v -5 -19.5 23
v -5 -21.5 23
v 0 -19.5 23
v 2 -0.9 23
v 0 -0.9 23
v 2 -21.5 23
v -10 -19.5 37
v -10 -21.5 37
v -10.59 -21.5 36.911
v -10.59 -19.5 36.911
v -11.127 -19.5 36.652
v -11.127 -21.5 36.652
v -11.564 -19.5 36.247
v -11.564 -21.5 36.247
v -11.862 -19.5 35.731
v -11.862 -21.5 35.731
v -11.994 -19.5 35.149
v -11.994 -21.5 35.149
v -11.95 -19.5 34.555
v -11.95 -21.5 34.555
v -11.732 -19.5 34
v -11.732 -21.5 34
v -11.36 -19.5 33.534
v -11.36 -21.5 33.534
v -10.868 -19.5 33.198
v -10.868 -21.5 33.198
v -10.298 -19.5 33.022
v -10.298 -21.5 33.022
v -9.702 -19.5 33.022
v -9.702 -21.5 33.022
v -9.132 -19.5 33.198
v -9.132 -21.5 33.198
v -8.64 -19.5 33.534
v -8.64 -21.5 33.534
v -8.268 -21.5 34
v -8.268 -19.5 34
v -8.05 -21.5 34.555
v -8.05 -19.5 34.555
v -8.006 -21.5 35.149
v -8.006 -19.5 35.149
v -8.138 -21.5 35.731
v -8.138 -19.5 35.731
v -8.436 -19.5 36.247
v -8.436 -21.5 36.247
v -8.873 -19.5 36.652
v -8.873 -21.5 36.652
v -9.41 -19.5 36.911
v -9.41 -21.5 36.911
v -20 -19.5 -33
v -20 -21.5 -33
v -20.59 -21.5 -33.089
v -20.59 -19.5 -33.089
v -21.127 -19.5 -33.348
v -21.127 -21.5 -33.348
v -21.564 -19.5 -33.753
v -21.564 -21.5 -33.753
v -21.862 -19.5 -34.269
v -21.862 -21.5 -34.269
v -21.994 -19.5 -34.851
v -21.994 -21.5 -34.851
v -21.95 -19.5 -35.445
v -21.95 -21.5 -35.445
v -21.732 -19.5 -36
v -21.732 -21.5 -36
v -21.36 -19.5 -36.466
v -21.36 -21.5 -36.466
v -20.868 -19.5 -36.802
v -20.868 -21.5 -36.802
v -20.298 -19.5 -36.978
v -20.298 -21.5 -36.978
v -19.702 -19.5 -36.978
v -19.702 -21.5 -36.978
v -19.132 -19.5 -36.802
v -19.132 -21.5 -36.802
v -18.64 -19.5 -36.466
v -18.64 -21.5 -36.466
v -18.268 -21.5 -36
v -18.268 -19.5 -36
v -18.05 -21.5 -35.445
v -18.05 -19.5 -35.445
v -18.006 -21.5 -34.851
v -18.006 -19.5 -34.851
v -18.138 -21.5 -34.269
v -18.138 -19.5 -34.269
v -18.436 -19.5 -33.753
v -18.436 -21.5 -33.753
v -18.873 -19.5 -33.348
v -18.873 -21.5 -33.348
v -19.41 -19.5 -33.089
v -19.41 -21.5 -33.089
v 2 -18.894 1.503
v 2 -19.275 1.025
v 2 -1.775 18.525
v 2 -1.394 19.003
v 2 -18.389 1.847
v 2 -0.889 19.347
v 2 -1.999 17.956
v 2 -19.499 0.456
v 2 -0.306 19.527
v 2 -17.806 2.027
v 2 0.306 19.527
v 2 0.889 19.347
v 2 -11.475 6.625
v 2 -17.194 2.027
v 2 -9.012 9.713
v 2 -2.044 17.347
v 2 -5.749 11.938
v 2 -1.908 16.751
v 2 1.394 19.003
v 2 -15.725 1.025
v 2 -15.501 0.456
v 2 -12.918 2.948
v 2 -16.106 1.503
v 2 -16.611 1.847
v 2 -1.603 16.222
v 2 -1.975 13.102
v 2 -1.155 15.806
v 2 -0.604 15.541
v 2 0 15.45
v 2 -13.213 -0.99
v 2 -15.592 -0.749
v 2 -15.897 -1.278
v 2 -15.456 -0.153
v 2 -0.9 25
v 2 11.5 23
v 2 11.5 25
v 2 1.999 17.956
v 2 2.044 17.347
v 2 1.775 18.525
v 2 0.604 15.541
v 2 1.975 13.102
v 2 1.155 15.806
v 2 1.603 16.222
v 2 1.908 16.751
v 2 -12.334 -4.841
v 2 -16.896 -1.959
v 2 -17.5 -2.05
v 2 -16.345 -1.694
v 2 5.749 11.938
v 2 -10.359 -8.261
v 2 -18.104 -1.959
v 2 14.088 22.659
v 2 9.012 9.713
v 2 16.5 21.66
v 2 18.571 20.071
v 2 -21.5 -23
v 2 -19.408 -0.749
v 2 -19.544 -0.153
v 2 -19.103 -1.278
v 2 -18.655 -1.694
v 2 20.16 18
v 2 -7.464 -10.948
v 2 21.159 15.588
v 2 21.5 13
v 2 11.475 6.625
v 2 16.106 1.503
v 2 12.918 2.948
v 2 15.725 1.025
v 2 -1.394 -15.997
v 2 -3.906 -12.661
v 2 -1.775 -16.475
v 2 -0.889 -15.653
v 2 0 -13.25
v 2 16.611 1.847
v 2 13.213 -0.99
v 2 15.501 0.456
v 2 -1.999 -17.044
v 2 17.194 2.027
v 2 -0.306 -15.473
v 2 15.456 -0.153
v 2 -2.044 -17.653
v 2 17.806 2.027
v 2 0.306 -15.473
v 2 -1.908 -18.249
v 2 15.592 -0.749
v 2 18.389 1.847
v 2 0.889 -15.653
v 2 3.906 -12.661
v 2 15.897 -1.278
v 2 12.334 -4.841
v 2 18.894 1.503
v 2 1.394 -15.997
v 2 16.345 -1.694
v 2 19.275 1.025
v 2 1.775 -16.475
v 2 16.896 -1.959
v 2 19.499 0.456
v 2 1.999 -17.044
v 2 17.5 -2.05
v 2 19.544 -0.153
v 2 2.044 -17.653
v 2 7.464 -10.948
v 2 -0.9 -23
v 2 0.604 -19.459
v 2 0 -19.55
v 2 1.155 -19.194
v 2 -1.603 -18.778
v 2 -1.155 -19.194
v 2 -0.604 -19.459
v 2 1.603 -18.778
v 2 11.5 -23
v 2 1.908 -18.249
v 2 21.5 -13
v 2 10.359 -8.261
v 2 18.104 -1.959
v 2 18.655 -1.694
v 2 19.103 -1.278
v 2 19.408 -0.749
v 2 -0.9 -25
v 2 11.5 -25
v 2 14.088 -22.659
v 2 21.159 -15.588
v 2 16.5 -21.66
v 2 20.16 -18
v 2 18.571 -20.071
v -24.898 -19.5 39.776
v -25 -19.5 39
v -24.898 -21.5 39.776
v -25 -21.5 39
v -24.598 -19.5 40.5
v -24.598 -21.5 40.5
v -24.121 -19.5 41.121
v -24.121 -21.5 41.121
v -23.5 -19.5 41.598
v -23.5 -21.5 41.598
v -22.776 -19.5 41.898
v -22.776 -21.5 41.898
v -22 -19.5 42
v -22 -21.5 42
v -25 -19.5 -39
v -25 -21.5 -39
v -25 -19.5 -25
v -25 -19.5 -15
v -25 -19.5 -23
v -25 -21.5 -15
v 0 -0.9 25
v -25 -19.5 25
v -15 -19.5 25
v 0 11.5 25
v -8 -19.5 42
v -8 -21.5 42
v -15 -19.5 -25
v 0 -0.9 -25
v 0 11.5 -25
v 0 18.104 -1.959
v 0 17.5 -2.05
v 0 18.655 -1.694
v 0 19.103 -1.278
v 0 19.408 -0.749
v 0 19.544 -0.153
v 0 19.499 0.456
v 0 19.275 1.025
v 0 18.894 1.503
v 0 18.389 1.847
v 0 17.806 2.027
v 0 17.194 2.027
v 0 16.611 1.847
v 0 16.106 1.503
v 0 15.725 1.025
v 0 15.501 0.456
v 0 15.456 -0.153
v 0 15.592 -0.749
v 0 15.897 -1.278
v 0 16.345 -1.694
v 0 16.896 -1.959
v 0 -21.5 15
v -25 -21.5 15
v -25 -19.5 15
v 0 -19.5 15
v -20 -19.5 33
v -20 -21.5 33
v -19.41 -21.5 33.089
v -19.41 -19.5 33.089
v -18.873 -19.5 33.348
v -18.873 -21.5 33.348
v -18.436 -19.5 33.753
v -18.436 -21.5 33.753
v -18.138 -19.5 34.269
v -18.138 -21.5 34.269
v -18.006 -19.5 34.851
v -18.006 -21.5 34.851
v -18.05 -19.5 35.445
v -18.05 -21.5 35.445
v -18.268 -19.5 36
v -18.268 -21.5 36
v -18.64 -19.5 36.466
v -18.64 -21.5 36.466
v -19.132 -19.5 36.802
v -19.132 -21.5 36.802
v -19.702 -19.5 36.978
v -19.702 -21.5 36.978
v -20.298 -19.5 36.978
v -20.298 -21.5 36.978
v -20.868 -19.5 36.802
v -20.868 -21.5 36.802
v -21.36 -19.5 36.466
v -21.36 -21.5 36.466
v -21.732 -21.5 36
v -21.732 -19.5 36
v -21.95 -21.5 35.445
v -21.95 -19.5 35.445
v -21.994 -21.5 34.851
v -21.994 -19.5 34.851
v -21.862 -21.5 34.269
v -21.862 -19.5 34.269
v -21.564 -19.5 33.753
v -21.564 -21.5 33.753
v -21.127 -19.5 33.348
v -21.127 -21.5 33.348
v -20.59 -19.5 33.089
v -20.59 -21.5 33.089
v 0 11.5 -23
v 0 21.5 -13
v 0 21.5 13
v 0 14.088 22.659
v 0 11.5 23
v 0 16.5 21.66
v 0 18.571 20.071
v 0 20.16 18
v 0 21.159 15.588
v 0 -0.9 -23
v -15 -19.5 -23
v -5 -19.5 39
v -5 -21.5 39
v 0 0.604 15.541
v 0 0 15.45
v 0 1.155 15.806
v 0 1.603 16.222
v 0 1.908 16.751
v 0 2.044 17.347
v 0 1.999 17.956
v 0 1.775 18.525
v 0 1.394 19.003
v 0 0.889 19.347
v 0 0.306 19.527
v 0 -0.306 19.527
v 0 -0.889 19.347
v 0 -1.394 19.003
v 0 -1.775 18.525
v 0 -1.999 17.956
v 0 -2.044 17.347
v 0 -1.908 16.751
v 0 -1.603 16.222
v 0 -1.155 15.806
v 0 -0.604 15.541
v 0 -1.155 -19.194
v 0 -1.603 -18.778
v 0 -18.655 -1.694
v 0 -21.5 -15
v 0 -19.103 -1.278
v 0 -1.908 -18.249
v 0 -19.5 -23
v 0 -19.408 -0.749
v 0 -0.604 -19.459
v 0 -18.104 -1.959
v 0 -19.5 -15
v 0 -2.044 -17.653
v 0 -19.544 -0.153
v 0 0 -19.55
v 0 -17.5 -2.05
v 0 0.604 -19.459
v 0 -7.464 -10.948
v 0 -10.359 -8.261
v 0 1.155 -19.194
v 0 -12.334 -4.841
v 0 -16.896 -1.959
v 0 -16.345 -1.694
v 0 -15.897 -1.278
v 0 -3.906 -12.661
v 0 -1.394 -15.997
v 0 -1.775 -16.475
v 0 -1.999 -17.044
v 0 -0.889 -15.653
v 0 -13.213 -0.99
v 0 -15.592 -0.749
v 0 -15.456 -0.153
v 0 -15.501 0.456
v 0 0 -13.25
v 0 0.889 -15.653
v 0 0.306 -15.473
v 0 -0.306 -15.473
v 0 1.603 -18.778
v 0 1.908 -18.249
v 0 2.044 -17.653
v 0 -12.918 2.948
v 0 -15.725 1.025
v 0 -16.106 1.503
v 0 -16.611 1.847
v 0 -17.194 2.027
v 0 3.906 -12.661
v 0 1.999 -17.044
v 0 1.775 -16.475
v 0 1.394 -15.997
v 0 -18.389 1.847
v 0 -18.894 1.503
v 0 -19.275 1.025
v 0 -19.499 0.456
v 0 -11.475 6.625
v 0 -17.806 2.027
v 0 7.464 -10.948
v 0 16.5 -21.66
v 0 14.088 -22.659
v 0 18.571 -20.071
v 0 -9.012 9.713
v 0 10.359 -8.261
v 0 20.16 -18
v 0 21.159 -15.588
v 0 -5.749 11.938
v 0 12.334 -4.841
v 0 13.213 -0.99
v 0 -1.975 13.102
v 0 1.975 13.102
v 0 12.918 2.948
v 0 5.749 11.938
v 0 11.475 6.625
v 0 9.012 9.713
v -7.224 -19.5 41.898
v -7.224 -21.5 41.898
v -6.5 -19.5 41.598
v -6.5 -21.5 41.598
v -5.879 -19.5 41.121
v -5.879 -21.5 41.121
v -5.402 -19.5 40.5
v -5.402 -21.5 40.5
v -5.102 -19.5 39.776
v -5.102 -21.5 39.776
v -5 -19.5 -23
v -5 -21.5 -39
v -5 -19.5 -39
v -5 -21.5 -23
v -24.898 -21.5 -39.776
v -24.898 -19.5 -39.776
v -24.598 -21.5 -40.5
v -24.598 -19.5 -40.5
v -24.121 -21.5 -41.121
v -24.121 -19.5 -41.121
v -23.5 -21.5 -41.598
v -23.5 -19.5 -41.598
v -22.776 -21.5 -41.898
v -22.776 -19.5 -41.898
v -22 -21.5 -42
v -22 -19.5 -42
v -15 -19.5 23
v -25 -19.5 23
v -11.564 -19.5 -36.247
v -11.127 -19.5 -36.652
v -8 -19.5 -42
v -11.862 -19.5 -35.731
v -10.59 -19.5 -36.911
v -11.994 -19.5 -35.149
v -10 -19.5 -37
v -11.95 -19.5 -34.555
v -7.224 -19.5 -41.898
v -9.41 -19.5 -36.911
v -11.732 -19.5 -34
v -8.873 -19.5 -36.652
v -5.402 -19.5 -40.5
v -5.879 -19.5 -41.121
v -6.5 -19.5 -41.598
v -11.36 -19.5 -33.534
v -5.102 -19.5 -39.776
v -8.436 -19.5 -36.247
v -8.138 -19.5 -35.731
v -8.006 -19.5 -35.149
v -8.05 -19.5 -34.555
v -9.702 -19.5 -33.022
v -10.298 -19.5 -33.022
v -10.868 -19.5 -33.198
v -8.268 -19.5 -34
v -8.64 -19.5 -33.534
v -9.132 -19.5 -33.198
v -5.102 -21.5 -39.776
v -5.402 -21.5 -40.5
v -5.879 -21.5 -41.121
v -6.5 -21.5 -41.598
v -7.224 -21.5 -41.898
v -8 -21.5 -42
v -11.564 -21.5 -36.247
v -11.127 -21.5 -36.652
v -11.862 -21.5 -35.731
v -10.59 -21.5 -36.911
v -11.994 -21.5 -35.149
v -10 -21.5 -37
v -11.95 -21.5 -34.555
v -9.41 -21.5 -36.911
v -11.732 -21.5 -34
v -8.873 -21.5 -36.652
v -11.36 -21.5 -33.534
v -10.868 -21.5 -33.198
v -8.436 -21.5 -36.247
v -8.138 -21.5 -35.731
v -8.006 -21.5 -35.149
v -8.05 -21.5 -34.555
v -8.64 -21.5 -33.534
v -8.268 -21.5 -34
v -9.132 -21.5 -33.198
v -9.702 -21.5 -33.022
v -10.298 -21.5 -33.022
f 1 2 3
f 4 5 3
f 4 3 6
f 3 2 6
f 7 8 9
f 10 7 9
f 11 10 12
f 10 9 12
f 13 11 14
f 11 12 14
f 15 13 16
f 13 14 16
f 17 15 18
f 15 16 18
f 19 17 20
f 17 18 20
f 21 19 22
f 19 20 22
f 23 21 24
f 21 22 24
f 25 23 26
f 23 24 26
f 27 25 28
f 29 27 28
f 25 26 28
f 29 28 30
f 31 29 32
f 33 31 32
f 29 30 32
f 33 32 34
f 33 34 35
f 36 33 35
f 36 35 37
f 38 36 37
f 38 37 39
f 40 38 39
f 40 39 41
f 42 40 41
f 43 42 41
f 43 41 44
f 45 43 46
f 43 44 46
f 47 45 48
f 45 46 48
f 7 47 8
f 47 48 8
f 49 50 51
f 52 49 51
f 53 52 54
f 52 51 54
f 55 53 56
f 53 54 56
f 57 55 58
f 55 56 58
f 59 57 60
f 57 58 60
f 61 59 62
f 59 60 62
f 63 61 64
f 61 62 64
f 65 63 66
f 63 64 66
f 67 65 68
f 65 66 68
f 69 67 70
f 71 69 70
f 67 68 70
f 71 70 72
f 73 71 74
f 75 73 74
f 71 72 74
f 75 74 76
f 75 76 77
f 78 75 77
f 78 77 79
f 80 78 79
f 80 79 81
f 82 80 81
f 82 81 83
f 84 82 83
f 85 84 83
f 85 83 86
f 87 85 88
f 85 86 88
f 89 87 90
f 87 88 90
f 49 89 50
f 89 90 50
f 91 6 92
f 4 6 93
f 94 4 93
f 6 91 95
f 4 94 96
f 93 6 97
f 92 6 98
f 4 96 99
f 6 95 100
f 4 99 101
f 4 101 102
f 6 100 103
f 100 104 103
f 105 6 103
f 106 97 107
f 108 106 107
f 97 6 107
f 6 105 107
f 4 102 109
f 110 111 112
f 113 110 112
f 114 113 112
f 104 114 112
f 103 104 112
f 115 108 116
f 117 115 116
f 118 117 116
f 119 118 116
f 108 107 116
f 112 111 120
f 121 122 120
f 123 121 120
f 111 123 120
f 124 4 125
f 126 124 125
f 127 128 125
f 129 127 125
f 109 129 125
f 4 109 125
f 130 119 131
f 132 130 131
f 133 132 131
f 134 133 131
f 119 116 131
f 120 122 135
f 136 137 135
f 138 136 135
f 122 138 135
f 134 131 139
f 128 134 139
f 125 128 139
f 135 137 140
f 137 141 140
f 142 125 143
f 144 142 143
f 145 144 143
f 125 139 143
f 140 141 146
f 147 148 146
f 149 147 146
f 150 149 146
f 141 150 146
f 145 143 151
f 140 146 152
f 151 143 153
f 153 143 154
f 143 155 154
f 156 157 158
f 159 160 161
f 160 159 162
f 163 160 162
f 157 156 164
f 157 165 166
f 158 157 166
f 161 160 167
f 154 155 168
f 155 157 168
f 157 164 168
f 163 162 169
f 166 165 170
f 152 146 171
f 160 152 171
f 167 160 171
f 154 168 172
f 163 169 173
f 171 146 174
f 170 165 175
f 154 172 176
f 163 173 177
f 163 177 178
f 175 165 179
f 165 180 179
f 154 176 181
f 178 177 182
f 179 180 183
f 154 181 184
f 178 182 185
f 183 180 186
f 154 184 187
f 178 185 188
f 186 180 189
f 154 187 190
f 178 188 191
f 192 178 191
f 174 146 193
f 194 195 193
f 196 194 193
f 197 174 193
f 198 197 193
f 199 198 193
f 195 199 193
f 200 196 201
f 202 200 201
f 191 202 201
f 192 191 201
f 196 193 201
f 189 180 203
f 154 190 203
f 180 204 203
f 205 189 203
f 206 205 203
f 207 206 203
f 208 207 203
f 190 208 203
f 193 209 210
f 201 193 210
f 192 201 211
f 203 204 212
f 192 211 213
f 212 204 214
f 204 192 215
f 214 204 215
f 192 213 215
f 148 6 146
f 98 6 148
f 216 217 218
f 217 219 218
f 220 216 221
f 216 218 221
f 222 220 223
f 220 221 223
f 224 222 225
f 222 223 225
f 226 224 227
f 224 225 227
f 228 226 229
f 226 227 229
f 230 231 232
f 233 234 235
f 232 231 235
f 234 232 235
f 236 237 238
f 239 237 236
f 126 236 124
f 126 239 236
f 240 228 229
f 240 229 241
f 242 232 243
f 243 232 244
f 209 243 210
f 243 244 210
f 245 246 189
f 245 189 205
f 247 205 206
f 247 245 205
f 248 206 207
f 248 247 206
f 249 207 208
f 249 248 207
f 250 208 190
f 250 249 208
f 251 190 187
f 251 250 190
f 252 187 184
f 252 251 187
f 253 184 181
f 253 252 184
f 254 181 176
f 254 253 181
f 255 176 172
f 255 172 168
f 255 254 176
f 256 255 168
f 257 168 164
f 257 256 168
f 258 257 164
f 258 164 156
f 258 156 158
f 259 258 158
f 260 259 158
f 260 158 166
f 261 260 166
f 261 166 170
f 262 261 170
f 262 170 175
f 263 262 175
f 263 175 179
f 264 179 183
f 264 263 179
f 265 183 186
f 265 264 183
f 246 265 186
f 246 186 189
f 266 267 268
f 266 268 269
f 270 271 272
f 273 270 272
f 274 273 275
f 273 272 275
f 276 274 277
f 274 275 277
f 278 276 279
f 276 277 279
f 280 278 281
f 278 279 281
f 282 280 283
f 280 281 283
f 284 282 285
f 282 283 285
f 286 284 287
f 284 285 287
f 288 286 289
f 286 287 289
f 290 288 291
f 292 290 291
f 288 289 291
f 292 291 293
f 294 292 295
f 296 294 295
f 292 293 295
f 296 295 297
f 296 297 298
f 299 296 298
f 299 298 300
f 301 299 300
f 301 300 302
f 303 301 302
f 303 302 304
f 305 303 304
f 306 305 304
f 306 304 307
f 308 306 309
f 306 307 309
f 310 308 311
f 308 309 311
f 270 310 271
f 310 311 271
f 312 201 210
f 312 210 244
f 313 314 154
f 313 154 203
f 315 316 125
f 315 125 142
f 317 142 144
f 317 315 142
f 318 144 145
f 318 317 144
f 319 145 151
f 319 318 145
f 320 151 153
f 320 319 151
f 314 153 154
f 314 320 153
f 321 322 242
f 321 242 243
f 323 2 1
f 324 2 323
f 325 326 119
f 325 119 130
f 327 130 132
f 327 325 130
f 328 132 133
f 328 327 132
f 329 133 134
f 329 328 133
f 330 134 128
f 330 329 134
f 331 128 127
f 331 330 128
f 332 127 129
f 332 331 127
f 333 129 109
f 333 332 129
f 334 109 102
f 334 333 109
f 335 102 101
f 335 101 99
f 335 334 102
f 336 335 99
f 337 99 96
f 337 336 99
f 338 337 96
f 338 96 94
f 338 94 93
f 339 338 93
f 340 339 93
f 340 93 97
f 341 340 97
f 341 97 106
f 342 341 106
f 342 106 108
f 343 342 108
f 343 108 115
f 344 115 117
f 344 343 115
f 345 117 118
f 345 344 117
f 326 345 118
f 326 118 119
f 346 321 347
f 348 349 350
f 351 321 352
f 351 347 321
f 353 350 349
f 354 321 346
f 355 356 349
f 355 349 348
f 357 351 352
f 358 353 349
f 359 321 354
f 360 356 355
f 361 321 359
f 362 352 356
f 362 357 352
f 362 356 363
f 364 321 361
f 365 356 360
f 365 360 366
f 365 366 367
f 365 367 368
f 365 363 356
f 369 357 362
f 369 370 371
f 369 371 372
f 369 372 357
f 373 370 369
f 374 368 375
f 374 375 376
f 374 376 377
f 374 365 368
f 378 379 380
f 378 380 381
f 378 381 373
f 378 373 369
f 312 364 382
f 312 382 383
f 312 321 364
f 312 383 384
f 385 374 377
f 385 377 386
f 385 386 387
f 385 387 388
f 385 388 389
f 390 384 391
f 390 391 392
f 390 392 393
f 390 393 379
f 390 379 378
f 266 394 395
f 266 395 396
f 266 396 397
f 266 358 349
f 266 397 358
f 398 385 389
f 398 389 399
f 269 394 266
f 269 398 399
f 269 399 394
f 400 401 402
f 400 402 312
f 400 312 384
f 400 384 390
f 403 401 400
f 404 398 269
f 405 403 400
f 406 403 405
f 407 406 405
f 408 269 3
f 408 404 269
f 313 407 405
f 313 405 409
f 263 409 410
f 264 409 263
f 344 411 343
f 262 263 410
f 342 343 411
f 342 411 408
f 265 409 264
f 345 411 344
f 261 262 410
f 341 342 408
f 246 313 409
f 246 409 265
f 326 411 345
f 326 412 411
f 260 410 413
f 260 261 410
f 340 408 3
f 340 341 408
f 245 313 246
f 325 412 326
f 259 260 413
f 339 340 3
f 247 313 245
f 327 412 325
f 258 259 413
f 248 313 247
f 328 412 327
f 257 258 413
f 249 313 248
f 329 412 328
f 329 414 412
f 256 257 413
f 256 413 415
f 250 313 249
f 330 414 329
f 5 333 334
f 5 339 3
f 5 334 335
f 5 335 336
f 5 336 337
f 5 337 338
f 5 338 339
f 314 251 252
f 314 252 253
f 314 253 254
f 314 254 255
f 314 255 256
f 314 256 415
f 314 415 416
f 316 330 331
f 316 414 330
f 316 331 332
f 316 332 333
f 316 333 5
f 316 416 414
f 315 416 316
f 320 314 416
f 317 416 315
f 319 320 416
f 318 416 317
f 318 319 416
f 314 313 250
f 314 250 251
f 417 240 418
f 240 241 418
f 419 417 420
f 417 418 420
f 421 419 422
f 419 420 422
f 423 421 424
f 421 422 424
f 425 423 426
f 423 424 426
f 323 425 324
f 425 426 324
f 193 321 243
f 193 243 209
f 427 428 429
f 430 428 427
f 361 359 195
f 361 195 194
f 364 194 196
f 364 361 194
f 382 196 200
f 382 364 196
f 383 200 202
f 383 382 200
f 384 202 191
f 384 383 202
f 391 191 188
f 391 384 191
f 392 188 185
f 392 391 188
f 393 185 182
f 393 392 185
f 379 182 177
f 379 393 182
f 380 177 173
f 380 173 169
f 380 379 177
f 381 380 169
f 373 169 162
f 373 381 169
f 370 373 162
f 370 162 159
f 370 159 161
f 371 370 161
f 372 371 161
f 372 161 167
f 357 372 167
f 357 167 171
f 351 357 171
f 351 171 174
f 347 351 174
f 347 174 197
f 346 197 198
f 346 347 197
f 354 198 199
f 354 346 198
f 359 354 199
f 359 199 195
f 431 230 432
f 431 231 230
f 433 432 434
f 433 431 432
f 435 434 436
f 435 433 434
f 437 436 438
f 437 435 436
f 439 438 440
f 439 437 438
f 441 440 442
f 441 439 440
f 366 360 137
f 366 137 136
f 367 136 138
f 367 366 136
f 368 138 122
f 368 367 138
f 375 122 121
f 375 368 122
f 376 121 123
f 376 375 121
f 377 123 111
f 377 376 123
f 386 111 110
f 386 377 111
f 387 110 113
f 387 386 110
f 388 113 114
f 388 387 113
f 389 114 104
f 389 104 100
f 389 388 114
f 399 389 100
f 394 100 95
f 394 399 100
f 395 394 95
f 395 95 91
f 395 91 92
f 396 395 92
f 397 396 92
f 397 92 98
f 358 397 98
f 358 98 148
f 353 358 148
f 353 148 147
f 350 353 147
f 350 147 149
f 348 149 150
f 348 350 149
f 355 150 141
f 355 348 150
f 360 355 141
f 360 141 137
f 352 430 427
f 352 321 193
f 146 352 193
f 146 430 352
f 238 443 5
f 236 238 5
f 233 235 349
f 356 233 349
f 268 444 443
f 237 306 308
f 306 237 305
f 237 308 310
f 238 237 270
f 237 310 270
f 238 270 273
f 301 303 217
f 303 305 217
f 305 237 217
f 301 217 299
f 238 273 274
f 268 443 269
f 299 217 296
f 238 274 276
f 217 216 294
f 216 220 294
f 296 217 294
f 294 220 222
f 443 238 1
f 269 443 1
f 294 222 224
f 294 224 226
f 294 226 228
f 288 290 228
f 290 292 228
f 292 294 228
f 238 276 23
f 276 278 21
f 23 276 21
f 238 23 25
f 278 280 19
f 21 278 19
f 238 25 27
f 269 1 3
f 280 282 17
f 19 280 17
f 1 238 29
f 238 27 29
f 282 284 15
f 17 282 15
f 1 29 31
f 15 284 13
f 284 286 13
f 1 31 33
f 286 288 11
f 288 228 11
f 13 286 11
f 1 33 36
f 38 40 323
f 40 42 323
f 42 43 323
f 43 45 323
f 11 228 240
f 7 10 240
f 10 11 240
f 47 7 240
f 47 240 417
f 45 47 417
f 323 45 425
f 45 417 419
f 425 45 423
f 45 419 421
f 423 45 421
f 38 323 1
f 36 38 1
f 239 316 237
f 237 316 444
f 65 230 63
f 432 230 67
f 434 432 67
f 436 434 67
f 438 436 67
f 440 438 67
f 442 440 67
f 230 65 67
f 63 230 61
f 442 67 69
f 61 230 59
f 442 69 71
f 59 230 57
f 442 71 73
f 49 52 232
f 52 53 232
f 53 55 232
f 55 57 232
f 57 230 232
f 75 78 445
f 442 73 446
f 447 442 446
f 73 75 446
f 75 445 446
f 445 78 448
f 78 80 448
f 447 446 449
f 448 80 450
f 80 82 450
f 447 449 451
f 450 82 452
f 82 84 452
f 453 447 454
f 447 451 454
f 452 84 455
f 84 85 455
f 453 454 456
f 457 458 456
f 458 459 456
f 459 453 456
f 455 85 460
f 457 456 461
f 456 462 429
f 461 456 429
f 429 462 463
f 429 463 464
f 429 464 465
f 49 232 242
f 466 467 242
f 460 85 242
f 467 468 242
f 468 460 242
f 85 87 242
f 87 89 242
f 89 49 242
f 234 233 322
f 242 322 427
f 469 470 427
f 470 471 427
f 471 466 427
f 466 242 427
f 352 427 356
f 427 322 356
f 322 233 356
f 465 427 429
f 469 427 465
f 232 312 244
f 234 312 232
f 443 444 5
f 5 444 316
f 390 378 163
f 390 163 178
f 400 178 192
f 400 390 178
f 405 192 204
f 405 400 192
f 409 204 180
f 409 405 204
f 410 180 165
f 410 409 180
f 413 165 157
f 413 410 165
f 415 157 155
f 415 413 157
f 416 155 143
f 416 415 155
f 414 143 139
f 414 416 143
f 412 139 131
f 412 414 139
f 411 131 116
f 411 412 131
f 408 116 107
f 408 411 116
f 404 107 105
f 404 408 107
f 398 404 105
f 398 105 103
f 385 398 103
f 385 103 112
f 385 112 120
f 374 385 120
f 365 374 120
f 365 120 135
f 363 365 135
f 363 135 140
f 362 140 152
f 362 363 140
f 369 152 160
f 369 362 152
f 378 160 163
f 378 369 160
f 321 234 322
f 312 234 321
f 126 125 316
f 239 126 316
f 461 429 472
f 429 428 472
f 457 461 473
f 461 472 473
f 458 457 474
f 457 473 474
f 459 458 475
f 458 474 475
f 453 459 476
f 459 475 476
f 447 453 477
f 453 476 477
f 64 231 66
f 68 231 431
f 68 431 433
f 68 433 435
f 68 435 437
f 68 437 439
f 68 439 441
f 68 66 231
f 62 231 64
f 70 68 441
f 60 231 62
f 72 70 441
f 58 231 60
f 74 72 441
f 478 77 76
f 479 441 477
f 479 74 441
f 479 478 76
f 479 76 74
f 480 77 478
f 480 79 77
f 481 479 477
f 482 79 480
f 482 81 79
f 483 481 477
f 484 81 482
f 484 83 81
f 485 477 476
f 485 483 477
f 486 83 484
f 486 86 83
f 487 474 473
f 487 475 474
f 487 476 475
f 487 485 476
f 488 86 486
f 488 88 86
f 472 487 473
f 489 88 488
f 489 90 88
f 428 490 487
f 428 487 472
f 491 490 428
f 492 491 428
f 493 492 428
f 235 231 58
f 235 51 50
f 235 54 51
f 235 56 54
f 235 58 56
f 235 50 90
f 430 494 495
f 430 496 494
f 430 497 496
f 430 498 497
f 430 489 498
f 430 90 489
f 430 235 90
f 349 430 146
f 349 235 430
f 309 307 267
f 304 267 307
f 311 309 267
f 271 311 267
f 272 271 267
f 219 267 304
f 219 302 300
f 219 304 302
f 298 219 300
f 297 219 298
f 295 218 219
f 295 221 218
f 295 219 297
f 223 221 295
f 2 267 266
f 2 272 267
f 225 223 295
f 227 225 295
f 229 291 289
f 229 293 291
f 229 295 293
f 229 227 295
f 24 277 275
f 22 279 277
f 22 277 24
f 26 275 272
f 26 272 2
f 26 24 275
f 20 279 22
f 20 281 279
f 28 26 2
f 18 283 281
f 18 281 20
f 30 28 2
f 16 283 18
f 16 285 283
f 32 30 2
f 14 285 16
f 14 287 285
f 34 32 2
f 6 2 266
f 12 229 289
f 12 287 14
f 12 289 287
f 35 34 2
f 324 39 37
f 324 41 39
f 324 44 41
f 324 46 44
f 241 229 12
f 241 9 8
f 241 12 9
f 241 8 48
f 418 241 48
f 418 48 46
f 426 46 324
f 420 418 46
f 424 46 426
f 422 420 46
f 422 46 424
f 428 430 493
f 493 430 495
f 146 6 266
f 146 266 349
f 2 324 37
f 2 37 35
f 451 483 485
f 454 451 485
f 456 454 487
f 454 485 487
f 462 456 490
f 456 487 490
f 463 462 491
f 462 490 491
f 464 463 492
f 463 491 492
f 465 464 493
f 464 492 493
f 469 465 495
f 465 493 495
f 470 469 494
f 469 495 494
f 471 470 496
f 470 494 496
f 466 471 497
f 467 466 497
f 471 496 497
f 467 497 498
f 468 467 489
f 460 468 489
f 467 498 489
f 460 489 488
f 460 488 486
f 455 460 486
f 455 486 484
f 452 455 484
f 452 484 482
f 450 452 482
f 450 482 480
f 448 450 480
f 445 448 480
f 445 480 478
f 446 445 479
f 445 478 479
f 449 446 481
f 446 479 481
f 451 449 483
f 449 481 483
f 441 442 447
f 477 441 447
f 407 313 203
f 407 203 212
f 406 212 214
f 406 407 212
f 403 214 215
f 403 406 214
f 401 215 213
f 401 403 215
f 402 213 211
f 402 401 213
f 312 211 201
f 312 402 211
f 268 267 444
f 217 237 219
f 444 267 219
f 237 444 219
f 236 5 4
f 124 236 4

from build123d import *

# Parameters (mm, degrees)
SKETCH1_R           = 13.25
SKETCH1_R_2         = 2.05
BOSS_EXTRUDE1_DEPTH = 2
SKETCH2_R           = 2
BOSS_EXTRUDE2_DEPTH = 2
BOSS_EXTRUDE3_DEPTH = 2
BOSS_EXTRUDE4_DEPTH = 2
SKETCH5_W           = 7
SKETCH5_H           = 5
CUT_EXTRUDE1_DEPTH  = 2
SKETCH6_W           = 20
SKETCH6_H           = 5
CUT_EXTRUDE2_DEPTH  = 2
FILLET1_R           = 3
SKETCH8_W           = 25
SKETCH8_H           = 8
BOSS_EXTRUDE5_DEPTH = 2


with BuildPart() as part:
    # Sketch1 → Boss-Extrude1 (new body)
    with BuildSketch(Plane(origin=(0, 0, 0), x_dir=(0, 0, -1), z_dir=(1, 0, 0))):
        with BuildLine():
            Line((-13, 21.5), (13, 21.5))
            ThreePointArc((13, 21.5), (20.071067812, 18.571067812), (23, 11.5))
            Line((23, 11.5), (23, -21.5))
            Line((23, -21.5), (-23, -21.5))
            Line((-23, -21.5), (-23, 11.5))
            ThreePointArc((-23, 11.5), (-20.071067812, 18.571067812), (-13, 21.5))
        make_face()
        Circle(SKETCH1_R, mode=Mode.SUBTRACT)
        with Locations((0, 17.5)):
            Circle(SKETCH1_R_2, mode=Mode.SUBTRACT)
        with Locations((17.5, 0)):
            Circle(SKETCH1_R_2, mode=Mode.SUBTRACT)
        with Locations((0, -17.5)):
            Circle(SKETCH1_R_2, mode=Mode.SUBTRACT)
        with Locations((-17.5, 0)):
            Circle(SKETCH1_R_2, mode=Mode.SUBTRACT)
    extrude(amount=BOSS_EXTRUDE1_DEPTH)

    # Sketch2 → Boss-Extrude2 (add)
    # profile 1 of 2: a face of its own
    with BuildSketch(Plane.XZ.offset(21.5)):
        Polygon((-5, 23), (-25, 23), (-25, 47), (-5, 47), (-5, 28), (2, 28), (2, 23), align=None)
        with Locations(Location((-20, 35, 0), (0, 0, 270))):
            Circle(SKETCH2_R, mode=Mode.SUBTRACT)
        with Locations(Location((-10, 35, 0), (0, 0, 90))):
            Circle(SKETCH2_R, mode=Mode.SUBTRACT)
    # profile 2 of 2: a face of its own
    with BuildSketch(Plane.XZ.offset(21.5)):
        Polygon((2, -23), (-5, -23), (-25, -23), (-25, -47), (-5, -47), (-5, -28), (2, -28), align=None)
        with Locations(Location((-10, -35, 0), (0, 0, 270))):
            Circle(SKETCH2_R, mode=Mode.SUBTRACT)
        with Locations(Location((-20, -35, 0), (0, 0, 90))):
            Circle(SKETCH2_R, mode=Mode.SUBTRACT)
    extrude(amount=-BOSS_EXTRUDE2_DEPTH)

    # Sketch3 → Boss-Extrude3 (add)
    with BuildSketch(Plane(origin=(0, 0, -23), x_dir=(-1, 0, 0), z_dir=(0, 0, -1))):
        Polygon((-2, 11.5), (0, 11.5), (25, -19.5), (15, -19.5), (0, -0.9), (-2, -0.9), align=None)
    extrude(amount=BOSS_EXTRUDE3_DEPTH)

    # Sketch4 → Boss-Extrude4 (add)
    with BuildSketch(Plane.XY.offset(23)):
        Polygon((2, 11.5), (0, 11.5), (-25, -19.5), (-15, -19.5), (0, -0.9), (2, -0.9), align=None)
    extrude(amount=BOSS_EXTRUDE4_DEPTH)

    # Sketch5 → Cut-Extrude1 (cut)
    with BuildSketch(Plane.XZ.offset(21.5)):
        with Locations((-1.5, 25.5)):
            Rectangle(SKETCH5_W, SKETCH5_H)
        with Locations((-1.5, -25.5)):
            Rectangle(SKETCH5_W, SKETCH5_H)
    extrude(amount=-CUT_EXTRUDE1_DEPTH, mode=Mode.SUBTRACT)

    # Sketch6 → Cut-Extrude2 (cut)
    with BuildSketch(Plane(origin=(0, -19.5, 0), x_dir=(1, 0, 0), z_dir=(0, 1, 0))):
        with Locations((-15, 44.5)):
            Rectangle(SKETCH6_W, SKETCH6_H)
        with Locations((-15, -44.5)):
            Rectangle(SKETCH6_W, SKETCH6_H)
    extrude(amount=-CUT_EXTRUDE2_DEPTH, mode=Mode.SUBTRACT)

    # Fillet1
    fillet1_edges = [part.edges().sort_by_distance(p)[0] for p in [
        (-5, -20.5, -42),
        (-25, -20.5, -42),
        (-25, -20.5, 42),
        (-5, -20.5, 42),
    ]]
    fillet(fillet1_edges, radius=FILLET1_R)

    # Sketch8 → Boss-Extrude5 (add)
    with BuildSketch(Plane.XZ.offset(21.5)):
        with Locations((-12.5, 19)):
            Rectangle(SKETCH8_W, SKETCH8_H)
        with Locations((-12.5, -19)):
            Rectangle(SKETCH8_W, SKETCH8_H)
    extrude(amount=-BOSS_EXTRUDE5_DEPTH)


solid = part.part
